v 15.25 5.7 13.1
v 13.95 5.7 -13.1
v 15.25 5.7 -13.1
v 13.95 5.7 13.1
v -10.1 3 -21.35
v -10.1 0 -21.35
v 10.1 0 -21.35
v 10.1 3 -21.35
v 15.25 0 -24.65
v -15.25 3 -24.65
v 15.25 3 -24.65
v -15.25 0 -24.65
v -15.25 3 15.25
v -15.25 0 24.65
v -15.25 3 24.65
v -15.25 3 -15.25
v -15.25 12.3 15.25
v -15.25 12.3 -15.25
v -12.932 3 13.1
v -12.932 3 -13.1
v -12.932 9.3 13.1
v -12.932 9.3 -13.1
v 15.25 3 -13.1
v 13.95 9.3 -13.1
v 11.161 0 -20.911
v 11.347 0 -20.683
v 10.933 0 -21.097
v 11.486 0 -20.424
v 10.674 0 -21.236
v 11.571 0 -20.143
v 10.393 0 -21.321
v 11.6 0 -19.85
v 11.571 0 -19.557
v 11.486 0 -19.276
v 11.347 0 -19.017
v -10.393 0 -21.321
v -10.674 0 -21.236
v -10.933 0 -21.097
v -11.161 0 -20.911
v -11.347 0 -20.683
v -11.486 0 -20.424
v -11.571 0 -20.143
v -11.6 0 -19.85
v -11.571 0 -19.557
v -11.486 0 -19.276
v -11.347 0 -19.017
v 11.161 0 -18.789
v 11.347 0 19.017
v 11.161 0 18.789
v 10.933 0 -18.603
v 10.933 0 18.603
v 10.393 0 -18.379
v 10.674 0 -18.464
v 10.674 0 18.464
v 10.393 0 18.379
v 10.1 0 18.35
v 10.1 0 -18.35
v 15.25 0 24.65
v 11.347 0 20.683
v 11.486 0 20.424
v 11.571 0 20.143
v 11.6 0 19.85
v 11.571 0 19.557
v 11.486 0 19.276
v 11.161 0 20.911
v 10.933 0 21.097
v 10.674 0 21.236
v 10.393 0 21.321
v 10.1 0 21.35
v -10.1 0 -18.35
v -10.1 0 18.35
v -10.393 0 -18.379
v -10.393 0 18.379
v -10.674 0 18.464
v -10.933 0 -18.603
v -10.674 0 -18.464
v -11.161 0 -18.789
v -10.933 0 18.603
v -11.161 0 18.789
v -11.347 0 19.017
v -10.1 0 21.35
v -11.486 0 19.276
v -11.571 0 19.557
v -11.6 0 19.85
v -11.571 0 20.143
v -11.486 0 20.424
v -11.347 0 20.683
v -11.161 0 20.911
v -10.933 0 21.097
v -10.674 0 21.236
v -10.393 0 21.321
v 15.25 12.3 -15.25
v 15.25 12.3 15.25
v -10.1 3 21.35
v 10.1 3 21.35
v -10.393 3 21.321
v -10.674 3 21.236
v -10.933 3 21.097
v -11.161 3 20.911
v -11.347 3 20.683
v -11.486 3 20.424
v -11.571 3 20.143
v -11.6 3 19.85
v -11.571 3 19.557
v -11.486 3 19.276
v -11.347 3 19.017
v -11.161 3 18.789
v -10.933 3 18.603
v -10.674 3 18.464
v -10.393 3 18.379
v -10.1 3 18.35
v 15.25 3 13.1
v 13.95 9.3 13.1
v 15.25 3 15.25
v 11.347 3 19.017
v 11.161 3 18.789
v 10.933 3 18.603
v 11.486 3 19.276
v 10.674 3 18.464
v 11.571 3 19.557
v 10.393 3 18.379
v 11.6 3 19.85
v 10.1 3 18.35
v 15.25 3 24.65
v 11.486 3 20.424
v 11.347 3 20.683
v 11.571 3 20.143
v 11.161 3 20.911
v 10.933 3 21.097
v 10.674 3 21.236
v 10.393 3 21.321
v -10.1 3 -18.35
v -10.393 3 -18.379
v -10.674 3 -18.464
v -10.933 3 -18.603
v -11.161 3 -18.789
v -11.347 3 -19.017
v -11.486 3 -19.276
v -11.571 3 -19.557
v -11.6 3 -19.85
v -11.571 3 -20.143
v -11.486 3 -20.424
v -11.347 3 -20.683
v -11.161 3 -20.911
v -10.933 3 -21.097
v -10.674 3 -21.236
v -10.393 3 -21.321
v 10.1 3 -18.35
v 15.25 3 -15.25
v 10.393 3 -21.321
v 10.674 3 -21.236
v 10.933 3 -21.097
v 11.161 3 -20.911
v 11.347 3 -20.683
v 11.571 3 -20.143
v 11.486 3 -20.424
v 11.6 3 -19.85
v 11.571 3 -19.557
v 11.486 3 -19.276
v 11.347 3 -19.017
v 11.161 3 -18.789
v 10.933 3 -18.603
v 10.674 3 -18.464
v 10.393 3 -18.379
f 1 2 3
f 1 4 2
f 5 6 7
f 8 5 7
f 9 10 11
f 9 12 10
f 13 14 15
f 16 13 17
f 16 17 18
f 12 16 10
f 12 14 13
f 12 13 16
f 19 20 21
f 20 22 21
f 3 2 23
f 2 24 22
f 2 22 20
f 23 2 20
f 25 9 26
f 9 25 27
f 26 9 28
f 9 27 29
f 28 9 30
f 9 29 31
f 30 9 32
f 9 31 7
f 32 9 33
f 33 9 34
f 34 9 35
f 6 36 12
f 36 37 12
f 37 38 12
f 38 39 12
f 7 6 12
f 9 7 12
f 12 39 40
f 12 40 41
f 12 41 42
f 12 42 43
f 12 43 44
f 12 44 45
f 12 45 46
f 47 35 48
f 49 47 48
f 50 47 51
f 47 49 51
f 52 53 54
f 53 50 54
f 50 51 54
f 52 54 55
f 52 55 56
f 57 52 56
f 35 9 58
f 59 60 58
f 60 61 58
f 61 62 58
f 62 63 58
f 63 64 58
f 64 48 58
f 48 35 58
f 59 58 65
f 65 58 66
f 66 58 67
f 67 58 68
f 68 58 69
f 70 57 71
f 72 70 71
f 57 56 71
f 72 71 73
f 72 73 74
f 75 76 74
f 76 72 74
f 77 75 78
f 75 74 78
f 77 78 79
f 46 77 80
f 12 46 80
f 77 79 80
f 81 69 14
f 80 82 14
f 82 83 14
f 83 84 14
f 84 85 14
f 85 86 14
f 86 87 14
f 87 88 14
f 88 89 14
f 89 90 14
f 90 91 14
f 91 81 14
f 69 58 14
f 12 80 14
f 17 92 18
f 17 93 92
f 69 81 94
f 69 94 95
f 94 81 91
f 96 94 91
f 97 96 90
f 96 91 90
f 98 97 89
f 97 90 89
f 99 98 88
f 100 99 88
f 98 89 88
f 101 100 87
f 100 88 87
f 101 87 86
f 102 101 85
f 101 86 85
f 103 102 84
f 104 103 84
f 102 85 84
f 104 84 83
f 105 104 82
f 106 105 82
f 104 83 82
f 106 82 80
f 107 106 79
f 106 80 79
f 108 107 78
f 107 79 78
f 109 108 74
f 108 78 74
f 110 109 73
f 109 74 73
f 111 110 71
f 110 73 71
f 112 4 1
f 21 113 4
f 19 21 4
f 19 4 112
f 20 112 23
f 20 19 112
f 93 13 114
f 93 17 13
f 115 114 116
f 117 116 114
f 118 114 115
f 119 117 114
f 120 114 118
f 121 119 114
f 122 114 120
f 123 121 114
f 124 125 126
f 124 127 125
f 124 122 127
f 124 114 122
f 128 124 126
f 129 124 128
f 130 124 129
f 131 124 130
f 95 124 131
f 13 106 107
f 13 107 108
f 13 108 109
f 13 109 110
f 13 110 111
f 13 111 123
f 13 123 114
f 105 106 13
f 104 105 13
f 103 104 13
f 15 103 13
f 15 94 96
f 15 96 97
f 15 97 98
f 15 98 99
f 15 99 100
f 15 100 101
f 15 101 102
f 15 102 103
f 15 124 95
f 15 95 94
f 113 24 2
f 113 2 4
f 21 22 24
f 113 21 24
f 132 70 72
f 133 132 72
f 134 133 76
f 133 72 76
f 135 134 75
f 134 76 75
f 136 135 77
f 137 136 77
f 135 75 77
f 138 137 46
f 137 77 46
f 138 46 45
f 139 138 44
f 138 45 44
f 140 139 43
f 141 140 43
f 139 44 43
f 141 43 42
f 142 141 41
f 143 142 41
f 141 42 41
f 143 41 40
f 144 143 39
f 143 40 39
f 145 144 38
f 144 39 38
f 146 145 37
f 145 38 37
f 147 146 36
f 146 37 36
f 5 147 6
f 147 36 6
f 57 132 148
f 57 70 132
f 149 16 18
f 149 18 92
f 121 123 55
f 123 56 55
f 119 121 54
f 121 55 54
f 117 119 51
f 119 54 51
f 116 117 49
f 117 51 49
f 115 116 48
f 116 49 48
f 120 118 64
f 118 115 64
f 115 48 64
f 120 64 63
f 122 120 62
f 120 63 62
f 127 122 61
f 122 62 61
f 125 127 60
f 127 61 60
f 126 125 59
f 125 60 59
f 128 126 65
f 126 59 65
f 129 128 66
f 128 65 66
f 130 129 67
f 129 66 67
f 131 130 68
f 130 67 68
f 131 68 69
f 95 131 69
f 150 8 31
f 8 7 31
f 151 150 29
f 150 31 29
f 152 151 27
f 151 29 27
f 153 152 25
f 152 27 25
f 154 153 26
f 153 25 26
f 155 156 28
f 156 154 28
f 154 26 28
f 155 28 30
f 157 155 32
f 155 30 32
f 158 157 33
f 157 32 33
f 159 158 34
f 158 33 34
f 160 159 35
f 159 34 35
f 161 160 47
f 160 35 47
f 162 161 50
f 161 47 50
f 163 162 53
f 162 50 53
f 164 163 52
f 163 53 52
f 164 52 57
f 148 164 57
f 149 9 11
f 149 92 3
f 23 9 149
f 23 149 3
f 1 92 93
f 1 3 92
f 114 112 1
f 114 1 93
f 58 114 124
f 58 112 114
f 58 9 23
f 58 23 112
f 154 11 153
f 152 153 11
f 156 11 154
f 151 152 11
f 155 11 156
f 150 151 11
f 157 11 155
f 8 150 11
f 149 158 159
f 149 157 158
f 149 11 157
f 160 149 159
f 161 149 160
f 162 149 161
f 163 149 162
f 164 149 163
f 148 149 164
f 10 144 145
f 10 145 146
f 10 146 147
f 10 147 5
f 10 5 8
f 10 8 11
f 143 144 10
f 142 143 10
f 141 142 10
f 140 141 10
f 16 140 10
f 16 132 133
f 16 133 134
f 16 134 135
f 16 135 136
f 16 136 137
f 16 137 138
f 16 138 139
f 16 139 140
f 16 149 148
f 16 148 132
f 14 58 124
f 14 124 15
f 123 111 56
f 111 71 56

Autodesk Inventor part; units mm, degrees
ref_plane "YZ Plane" through (0, 0, 0) normal (1, 0, 0) x (0, 1, 0)
ref_plane "XZ Plane" through (0, 0, 0) normal (0, 1, 0) x (-1, 0, 0)
ref_plane "XY Plane" through (0, 0, 0) normal (0, 0, 1) x (1, 0, 0)
sketch "Sketch1" plane through (0, 0, 0) normal (0, 1, 0) x (-1, 0, 0)
  line L0 (15.25, -24.65) -> (-15.25, -24.65)
  line L1 (-15.25, -24.65) -> (-15.25, 24.65)
  line L2 (-15.25, 24.65) -> (15.25, 24.65)
  line L3 (15.25, 24.65) -> (15.25, -24.65)
  line L4 (15.25, -24.65) -> (-15.25, 24.65) construction
  line L5 (-15.25, -24.65) -> (15.25, 24.65) construction
  circle A0 centre (10.1, 19.85) radius 1.5
  circle A1 centre (-10.1, 19.85) radius 1.5
  line L6 (10.1, 21.35) -> (-10.1, 21.35)
  circle A2 centre (10.1, -19.85) radius 1.5
  circle A3 centre (-10.1, -19.85) radius 1.5
  line L7 (10.1, -21.35) -> (-10.1, -21.35)
  line L8 (21.35, 0) -> (-21.35, 0) construction
  line L9 (10.1, -18.35) -> (-10.1, -18.35)
  line L10 (10.1, 18.35) -> (-10.1, 18.35)
  line L11 (15.25, -15.25) -> (-15.25, -15.25)
  line L12 (-15.25, -15.25) -> (-15.25, 15.25)
  line L13 (-15.25, 15.25) -> (15.25, 15.25)
  line L14 (15.25, 15.25) -> (15.25, -15.25)
  line L15 (15.25, -15.25) -> (-15.25, 15.25) construction
  line L16 (-15.25, -15.25) -> (15.25, 15.25) construction
  line L17 (0, -34.51) -> (0, 34.51) projected
  point P0 (0, 0)
  dimension "d11" = 49.3
  dimension "d12" = 30.5
  dimension "d13" = 23.2
  dimension "d14" = 3
  dimension "d15" = 3.3
  dimension "d16" = 30.5
extrude "Extrusion1" add sketch "Sketch1" along normal blind 3 contours L0 L17 L7 A2 L9 L11 L3 | L0 L1 L11 L17 L9 A3 L7 | L11 L17 L13 L3 | L13 L17 L10 A0 L6 L2 L3 | L11 L1 L13 L17 | L13 L1 L2 L17 L6 A1 L10
extrude "Extrusion2" add sketch "Sketch1" along normal blind 12.3 contours L11 L17 L13 L3 | L11 L1 L13 L17
sketch "Sketch2" plane through (0, 12.3, 0) normal (0, 1, 0) x (1, 0, 0)
  line L0 (12.9324, 13.1) -> (-12.9324, 13.1)
  line L1 (-12.9324, 13.1) -> (-12.9324, -13.1)
  line L2 (-12.9324, -13.1) -> (12.9324, -13.1)
  line L3 (12.9324, -13.1) -> (12.9324, 13.1)
  line L4 (12.9324, 13.1) -> (-12.9324, -13.1) construction
  line L5 (-12.9324, 13.1) -> (12.9324, -13.1) construction
  point P0 (0, 0)
  dimension "d21" = 26.2
extrude "Extrusion3" cut sketch "Sketch2" against normal blind 9.3
sketch "Sketch3" plane through (12.9324, 12.3, -13.1) normal (-1, 0, 0) x (0, 0, 1)
  line L0 (26.2, 0) -> (26.2, -9.3) projected
  line L1 (26.2, -9.3) -> (0, -9.3) projected
  line L2 (0, 0) -> (0, -9.3) projected
  line L3 (-2.15, 0) -> (28.35, 0) projected
  line L4 (0, 0) -> (26.2, 0) projected
  line L5 (26.2, 0) -> (0, 0)
  line L6 (0, 0) -> (0, -9.3)
  line L7 (0, -9.3) -> (26.2, -9.3)
  line L8 (26.2, -9.3) -> (26.2, 0)
  point P0 (13.1, -12.3)
extrude "Extrusion4" cut sketch "Sketch3" against normal through all
sketch "Sketch6" plane through (0, 12.3, 0) normal (0, 1, 0) x (1, 0, 0)
  line L0 (-15.25, 15.25) -> (-15.25, -15.25) projected
  line L1 (15.25, 15.25) -> (15.25, 24.65) projected
  line L2 (-15.25, -15.25) -> (15.25, -15.25)
  line L3 (15.25, -15.25) -> (15.25, 15.25)
  line L4 (15.25, 15.25) -> (-15.25, 15.25)
  line L5 (-15.25, 15.25) -> (-15.25, -15.25)
  point P0 (0, 0)
extrude "Extrusion5" add sketch "Sketch6" against normal blind 3
sketch "Sketch7" plane through (0, 9.3, 0) normal (0, -1, 0) x (1, 0, 0)
  line L0 (15.25, 15.25) -> (15.25, -15.25) projected
  line L1 (-15.25, 15.25) -> (15.25, 15.25) projected
  line L2 (15.25, -15.25) -> (13.95, -15.25)
  line L3 (13.95, -15.25) -> (13.95, 15.25)
  line L4 (13.95, 15.25) -> (15.25, 15.25)
  line L5 (15.25, 15.25) -> (15.25, -15.25)
  line L6 (-15.25, -24.65) -> (-15.25, 24.65) projected
  point P0 (0, 0)
  dimension "d29" = 29.2
extrude "Extrusion6" add sketch "Sketch7" along normal blind 3.6
equation "\"d11\" = length"
equation "\"d12\" = width"
equation "\"d13\" = opening_length"
equation "\"d14\" = opening_width"
equation "\"d15\" = opening_distance_to_edge"
equation "\"d16\" = camera_box_width"
equation "\"d17\" = thickness"
equation "\"d19\" = height"
equation "\"d21\" = inside_width"
equation "\"d22\" = height - thickness"
equation "\"d26\" = thickness"
equation "\"d29\" = inside_width + thickness"
equation "\"d30\" = 1.2 * thickness"
equation "\"width\" = 30.5"
equation "\"length\" = 49.3"
equation "\"opening_width\" = 3"
equation "\"opening_length\" = 23.2"
equation "\"opening_distance_to_edge\" = 3.3"
equation "\"camera_box_width\" = 30.5"
equation "\"thickness\" = 3"
equation "\"inside_width\" = 26.2"
equation "\"height\" = 12.3"
properties part number "bottom" material "SAN Plastic"
